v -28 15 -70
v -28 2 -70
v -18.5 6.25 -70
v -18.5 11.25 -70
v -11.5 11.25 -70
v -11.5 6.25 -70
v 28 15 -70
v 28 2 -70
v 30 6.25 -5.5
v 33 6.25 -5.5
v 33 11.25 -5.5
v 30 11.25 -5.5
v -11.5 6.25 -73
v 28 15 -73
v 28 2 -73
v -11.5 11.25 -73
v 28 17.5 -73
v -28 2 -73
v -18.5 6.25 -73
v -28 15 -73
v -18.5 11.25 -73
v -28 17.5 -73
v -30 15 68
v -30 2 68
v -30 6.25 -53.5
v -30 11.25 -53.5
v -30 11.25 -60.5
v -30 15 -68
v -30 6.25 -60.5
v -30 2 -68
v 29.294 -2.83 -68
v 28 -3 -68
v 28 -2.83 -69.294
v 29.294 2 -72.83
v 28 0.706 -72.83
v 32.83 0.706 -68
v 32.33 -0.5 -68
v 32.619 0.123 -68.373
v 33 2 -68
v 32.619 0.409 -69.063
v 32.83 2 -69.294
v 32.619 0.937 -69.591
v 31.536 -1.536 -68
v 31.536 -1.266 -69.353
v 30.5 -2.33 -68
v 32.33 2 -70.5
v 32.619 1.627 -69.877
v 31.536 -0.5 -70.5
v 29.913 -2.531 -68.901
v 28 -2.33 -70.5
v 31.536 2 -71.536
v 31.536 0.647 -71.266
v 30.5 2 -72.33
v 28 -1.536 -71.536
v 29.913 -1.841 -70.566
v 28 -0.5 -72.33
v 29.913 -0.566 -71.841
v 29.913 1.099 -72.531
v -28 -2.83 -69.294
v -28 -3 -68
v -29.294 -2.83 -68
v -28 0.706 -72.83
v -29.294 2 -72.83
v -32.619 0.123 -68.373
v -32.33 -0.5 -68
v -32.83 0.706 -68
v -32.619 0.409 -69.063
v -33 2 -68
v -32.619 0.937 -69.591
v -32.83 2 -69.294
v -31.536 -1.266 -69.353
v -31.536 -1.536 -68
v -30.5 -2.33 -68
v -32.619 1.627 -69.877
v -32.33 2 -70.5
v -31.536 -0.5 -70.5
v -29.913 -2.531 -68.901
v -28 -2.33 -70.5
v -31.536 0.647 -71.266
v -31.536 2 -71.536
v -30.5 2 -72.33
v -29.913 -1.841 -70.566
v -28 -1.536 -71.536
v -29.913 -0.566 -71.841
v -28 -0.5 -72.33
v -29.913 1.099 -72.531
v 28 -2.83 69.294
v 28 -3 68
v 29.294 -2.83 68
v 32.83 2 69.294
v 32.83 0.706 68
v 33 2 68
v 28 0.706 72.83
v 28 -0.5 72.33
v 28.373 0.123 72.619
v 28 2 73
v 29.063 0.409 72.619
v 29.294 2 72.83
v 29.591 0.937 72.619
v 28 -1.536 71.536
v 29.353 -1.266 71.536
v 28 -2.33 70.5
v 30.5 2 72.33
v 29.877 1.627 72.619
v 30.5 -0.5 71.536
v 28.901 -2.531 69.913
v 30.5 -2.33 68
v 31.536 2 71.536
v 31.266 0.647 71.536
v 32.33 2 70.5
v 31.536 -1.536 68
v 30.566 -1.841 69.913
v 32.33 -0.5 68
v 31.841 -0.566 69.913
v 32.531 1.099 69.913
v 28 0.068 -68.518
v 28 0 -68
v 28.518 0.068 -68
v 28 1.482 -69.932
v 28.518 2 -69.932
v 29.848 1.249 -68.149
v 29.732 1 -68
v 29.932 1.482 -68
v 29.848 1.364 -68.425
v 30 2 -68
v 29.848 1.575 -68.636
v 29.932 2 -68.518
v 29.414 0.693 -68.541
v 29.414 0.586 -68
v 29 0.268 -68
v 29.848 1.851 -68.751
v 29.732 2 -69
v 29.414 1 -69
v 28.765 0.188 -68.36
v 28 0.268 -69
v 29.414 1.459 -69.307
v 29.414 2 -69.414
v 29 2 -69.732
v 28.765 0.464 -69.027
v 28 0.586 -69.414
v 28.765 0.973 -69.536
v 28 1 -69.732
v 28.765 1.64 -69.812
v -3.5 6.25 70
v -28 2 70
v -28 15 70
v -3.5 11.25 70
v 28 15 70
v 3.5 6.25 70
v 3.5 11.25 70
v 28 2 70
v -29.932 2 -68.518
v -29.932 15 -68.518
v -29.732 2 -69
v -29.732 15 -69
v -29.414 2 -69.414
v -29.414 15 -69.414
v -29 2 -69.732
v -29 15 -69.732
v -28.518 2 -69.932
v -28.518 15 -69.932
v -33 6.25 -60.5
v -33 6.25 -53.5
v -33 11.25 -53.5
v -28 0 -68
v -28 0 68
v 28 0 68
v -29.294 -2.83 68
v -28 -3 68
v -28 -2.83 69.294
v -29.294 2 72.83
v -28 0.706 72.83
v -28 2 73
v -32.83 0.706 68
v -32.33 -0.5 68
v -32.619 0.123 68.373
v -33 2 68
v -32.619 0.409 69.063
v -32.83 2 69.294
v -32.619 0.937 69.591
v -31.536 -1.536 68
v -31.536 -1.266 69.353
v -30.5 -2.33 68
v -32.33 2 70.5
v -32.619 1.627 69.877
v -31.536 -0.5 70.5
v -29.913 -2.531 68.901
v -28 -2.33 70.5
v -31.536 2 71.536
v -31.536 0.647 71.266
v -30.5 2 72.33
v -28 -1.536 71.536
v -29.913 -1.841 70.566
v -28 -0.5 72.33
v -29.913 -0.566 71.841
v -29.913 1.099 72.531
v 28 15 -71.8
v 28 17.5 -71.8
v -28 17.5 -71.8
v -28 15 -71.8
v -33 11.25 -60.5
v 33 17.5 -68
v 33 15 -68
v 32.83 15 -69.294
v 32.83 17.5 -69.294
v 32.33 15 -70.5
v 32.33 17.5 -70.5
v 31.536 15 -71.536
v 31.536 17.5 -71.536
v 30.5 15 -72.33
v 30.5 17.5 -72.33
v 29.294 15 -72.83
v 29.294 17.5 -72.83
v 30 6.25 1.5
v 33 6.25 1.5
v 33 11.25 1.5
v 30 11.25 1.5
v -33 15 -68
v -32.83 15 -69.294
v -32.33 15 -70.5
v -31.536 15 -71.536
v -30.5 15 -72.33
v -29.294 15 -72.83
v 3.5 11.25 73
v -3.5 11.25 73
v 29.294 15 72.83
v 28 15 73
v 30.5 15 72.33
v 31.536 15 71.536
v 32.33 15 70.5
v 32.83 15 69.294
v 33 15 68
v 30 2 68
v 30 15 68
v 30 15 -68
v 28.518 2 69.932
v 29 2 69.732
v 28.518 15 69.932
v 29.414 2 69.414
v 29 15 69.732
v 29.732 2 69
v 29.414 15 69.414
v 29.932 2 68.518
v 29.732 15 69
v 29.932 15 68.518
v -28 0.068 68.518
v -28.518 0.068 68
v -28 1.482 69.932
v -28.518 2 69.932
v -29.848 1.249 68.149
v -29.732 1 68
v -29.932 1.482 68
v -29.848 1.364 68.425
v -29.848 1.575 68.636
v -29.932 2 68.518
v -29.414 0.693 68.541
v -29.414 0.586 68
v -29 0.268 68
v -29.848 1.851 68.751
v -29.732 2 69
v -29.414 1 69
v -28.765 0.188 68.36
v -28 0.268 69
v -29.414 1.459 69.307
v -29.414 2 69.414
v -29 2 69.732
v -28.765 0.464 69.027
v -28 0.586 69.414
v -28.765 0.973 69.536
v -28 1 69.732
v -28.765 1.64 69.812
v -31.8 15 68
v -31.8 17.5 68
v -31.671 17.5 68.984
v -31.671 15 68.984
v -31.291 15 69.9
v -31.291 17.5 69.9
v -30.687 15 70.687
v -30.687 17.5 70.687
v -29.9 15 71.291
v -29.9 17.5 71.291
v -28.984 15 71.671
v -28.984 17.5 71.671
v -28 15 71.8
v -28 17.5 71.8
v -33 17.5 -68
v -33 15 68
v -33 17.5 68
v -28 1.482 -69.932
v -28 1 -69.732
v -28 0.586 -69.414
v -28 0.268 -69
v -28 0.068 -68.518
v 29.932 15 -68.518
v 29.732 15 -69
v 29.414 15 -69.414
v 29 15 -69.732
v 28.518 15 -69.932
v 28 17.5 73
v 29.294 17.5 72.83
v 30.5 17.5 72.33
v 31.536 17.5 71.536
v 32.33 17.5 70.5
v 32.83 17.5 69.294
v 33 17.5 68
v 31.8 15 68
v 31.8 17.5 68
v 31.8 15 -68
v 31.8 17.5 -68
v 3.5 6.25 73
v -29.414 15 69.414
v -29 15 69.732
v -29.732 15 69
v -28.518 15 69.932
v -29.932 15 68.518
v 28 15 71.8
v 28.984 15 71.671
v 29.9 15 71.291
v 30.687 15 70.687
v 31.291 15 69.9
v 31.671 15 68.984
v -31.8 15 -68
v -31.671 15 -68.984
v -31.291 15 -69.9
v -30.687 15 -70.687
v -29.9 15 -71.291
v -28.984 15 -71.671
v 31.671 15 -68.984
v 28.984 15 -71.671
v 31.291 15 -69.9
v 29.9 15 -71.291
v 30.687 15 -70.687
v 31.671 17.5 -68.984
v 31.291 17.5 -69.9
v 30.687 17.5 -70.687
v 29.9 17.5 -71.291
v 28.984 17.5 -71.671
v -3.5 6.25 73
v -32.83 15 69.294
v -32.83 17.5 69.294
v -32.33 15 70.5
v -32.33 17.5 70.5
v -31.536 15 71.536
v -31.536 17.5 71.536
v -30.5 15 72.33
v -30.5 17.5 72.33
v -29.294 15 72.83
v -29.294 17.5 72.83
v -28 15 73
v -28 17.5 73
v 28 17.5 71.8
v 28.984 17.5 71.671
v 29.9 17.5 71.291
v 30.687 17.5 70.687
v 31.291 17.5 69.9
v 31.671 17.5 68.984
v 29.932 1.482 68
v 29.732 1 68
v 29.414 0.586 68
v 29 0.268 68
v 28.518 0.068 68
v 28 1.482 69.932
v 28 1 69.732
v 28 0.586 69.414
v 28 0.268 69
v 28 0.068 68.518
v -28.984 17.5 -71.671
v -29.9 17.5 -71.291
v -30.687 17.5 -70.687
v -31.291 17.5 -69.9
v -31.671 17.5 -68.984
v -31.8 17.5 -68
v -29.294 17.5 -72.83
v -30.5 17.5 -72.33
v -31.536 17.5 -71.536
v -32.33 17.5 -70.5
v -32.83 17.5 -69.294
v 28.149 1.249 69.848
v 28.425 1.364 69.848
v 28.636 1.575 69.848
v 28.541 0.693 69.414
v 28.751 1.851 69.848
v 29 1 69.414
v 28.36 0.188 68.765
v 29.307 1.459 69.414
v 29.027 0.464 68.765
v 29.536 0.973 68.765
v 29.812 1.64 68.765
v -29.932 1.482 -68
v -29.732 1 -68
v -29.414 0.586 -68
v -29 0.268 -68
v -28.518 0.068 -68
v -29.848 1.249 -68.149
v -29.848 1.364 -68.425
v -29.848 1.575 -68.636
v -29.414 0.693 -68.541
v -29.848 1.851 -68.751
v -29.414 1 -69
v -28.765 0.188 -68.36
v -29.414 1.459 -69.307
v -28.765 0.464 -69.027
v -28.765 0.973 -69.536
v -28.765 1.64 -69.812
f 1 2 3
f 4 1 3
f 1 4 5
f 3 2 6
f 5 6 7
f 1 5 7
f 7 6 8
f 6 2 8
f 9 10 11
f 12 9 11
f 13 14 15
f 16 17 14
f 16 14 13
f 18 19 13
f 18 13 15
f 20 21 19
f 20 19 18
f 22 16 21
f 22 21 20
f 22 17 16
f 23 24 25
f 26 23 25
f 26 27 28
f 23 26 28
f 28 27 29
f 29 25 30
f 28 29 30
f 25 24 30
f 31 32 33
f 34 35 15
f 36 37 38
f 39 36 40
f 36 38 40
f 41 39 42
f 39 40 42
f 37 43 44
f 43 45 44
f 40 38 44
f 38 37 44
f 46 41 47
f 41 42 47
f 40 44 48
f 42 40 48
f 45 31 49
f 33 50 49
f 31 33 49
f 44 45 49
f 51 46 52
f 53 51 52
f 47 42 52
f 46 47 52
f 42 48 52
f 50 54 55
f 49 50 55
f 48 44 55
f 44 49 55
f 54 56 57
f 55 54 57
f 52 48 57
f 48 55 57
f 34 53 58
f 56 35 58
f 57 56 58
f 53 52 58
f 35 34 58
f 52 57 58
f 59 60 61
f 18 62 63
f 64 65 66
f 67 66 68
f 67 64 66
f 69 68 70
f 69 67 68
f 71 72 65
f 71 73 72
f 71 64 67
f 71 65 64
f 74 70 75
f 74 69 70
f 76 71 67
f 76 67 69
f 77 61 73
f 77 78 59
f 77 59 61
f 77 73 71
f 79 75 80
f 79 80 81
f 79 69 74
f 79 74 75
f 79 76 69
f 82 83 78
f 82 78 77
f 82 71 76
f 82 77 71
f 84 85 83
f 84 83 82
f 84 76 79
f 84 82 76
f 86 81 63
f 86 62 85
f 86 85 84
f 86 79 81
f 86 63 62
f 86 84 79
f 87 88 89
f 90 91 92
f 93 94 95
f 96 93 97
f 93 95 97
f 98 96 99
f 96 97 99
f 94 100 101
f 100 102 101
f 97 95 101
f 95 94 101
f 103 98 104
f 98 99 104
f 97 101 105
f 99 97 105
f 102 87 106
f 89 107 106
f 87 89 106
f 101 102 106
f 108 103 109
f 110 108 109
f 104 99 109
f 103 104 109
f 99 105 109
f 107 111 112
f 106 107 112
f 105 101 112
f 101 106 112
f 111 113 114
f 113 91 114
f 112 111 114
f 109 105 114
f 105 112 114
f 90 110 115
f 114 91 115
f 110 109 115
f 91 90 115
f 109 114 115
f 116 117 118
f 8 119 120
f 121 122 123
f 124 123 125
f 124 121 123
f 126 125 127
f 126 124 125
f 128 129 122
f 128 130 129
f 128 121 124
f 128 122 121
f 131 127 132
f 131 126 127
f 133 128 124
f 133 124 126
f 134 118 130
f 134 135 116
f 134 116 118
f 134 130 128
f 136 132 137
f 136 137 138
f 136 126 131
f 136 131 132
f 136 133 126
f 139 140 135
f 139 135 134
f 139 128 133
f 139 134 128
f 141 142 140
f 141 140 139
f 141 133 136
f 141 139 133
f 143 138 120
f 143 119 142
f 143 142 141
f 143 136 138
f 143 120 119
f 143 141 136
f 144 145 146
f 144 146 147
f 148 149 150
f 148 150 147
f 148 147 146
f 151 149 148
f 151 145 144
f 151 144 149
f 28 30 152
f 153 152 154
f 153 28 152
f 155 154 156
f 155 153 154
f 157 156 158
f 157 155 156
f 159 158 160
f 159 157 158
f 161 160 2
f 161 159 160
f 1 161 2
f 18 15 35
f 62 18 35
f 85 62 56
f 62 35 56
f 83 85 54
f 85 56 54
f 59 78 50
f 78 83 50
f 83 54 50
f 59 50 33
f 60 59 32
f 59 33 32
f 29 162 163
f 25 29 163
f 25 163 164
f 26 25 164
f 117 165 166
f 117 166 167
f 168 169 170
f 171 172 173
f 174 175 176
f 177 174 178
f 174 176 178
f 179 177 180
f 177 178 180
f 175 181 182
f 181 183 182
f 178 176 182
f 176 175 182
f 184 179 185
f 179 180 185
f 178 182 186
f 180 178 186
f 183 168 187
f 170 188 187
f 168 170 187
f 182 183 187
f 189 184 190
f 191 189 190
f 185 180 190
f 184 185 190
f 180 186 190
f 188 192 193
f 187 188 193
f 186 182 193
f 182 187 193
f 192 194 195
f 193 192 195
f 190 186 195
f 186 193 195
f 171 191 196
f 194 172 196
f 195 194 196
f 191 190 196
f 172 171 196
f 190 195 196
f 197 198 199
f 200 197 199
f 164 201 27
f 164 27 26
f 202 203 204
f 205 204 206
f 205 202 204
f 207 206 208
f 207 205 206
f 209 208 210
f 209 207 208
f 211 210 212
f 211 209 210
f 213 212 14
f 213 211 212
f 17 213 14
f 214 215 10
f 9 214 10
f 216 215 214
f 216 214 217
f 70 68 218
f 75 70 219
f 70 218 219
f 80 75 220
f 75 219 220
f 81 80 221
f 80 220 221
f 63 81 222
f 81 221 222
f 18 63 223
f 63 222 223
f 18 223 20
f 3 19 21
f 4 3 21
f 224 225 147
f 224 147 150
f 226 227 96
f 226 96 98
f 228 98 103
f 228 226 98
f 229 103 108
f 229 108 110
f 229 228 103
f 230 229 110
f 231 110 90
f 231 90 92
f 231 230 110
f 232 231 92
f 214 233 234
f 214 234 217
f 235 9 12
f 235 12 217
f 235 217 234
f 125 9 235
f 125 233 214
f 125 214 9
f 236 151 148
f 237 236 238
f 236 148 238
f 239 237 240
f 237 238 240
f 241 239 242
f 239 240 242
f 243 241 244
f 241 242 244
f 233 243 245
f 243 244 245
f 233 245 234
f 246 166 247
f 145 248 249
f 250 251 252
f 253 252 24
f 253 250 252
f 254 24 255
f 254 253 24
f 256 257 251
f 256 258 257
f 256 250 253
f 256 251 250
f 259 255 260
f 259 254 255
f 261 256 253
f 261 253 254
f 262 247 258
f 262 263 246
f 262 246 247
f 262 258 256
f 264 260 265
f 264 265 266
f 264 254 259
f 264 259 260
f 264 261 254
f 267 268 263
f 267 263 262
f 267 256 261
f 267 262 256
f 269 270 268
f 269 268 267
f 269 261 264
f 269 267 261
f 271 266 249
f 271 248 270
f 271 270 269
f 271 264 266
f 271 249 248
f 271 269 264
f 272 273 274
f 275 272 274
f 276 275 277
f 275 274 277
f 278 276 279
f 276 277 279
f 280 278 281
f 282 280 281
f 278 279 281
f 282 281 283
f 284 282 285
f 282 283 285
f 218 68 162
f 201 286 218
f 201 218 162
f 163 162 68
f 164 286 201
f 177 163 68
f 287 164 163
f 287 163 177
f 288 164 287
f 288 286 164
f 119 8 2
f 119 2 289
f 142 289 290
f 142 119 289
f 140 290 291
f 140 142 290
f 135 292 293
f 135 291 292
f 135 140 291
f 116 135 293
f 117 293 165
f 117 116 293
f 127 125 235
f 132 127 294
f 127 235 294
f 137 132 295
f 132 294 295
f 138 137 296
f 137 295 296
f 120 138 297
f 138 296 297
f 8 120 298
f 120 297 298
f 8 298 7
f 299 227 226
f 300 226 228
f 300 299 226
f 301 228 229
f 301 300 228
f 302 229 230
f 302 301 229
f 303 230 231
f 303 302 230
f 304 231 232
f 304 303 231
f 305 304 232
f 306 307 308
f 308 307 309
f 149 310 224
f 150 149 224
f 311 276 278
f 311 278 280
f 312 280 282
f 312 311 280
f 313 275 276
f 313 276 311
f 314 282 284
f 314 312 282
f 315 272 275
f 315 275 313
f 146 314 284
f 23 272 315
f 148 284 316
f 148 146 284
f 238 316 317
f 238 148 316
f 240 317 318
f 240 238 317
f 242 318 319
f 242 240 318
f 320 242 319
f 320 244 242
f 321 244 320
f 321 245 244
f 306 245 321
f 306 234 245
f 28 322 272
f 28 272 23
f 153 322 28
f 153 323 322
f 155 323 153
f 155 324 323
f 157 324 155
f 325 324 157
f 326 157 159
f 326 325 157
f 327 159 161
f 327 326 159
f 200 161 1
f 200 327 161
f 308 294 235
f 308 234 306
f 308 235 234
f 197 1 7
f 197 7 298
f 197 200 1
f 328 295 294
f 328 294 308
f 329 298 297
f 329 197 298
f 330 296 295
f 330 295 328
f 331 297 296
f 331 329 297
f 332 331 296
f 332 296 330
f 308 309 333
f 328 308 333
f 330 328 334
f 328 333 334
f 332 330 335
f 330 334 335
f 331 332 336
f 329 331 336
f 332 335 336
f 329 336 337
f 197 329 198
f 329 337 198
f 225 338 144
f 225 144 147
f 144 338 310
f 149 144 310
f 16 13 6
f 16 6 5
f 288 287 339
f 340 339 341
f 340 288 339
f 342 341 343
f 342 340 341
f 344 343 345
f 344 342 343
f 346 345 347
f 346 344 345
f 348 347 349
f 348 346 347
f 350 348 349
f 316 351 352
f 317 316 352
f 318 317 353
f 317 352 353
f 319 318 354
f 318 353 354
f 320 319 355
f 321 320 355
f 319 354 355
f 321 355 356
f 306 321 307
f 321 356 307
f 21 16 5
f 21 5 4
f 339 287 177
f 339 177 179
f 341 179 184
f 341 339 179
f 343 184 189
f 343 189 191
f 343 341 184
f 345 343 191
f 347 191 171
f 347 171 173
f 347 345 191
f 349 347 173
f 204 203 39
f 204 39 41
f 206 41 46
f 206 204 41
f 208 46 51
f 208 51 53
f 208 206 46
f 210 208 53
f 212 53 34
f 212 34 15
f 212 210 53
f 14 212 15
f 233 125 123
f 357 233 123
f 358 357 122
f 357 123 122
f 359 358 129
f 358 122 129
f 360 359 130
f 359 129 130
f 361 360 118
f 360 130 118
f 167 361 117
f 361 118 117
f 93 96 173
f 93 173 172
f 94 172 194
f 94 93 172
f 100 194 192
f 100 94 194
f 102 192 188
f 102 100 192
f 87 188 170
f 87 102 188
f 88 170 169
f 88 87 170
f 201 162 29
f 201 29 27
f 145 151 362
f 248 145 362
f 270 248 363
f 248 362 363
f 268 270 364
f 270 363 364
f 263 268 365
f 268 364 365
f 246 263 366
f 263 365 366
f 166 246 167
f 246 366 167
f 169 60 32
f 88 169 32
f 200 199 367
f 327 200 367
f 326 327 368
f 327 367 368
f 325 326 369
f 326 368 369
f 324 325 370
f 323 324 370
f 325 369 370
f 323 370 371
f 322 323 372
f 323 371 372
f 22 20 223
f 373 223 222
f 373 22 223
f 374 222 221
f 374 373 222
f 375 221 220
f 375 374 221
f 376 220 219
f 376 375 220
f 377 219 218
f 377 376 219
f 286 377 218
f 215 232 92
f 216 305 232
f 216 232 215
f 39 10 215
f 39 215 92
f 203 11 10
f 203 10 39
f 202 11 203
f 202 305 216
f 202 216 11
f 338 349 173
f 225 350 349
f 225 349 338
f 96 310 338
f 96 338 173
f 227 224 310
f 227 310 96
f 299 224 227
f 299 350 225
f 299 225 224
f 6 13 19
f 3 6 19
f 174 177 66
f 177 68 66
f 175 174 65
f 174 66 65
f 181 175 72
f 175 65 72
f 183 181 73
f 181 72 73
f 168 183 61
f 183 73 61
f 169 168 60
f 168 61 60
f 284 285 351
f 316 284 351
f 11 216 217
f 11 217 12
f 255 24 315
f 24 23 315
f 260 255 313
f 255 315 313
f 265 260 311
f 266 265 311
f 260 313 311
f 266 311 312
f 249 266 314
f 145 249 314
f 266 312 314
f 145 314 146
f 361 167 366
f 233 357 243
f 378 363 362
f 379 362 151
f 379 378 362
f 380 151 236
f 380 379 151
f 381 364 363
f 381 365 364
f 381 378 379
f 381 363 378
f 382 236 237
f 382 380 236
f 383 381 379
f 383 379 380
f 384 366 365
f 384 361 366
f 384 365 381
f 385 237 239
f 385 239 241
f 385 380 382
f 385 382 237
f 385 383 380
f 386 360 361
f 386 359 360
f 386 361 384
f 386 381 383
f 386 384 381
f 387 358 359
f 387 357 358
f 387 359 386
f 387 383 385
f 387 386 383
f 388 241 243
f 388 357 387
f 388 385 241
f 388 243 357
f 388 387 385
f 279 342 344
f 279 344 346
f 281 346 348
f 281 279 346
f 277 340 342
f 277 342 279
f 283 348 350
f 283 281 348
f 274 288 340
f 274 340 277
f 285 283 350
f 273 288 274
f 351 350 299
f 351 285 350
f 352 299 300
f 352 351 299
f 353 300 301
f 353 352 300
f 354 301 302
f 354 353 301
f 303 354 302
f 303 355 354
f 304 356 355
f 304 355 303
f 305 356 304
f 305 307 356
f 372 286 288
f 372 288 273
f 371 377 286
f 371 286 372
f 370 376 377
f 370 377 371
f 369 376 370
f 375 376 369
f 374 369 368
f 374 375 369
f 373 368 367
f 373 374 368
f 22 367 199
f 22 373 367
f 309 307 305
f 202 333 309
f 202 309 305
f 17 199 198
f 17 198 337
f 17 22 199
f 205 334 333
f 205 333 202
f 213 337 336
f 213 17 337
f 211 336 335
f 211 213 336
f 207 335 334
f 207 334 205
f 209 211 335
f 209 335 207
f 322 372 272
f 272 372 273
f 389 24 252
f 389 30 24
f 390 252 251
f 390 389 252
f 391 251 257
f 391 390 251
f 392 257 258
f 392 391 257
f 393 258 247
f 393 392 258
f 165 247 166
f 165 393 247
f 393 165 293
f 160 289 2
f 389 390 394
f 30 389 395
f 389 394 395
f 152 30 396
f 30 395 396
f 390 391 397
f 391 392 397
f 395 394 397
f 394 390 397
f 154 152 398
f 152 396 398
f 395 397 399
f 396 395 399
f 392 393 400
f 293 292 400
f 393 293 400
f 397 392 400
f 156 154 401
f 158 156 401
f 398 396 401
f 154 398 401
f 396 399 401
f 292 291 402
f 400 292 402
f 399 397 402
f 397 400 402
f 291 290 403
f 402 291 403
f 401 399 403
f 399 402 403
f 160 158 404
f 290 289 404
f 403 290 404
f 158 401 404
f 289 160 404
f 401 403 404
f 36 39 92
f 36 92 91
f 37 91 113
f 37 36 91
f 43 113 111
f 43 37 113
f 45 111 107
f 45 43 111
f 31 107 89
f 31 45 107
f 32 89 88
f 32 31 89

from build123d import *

# Parameters (mm, degrees)
ESBO_O1_W                = 60
ESBO_O1_H                = 140
RESSALTO_EXTRUS_O1_DEPTH = 15
FILETE1_R                = 2
CASCA1_T                 = 3
RESSALTO_EXTRUS_O2_START = 2.5
RESSALTO_EXTRUS_O2_DEPTH = 2.5
CORTE_EXTRUS_O1_REACH    = 101.956
ESBO_O4_W                = 7
ESBO_O4_H                = 5
CORTE_EXTRUS_O2_REACH    = 152.703
ESBO_O5_W                = 7
ESBO_O5_H                = 5
CORTE_EXTRUS_O3_REACH    = 101.956
ESBO_O6_W                = 7
ESBO_O6_H                = 5
CORTE_EXTRUS_O4_REACH    = 152.703
ESBO_O7_W                = 7
ESBO_O7_H                = 5


with BuildPart() as part:
    # Esboço1 → Ressalto-extrusão1 (new body)
    with BuildSketch(Plane(origin=(0, 0, 0), x_dir=(1, 0, 0), z_dir=(0, 1, 0))):
        Rectangle(ESBO_O1_W, ESBO_O1_H)
    extrude(amount=RESSALTO_EXTRUS_O1_DEPTH)

    # Filete1
    filete1_edges = [part.edges().sort_by_distance(p)[0] for p in [
        (0, 0, -70),
        (30, 0, 0),
        (0, 0, 70),
        (-30, 0, 0),
        (-30, 7.5, -70),
        (30, 7.5, -70),
        (30, 7.5, 70),
        (-30, 7.5, 70),
    ]]
    fillet(filete1_edges, radius=FILETE1_R)

    # Casca1
    casca1_openings = [part.faces().sort_by_distance(p)[0] for p in [
        (0, 15, 0),
    ]]
    offset(amount=CASCA1_T, openings=casca1_openings, kind=Kind.INTERSECTION)

    # Esboço3 → Ressalto-extrusão2 (add)
    with BuildSketch(Plane(origin=(0, 15, 0), x_dir=(1, 0, 0), z_dir=(0, 1, 0)).offset(RESSALTO_EXTRUS_O2_START)):
        with BuildLine():
            Line((28, 73), (-28, 73))
            ThreePointArc((-28, 73), (-31.535533906, 71.535533906), (-33, 68))
            Line((-33, 68), (-33, -68))
            ThreePointArc((-33, -68), (-31.535533906, -71.535533906), (-28, -73))
            Line((-28, -73), (28, -73))
            ThreePointArc((28, -73), (31.535533906, -71.535533906), (33, -68))
            Line((33, -68), (33, 68))
            ThreePointArc((33, 68), (31.535533906, 71.535533906), (28, 73))
        make_face()
        with BuildLine():
            Line((-31.8, 68), (-31.8, -68))
            ThreePointArc((-31.8, -68), (-30.687005769, -70.687005769), (-28, -71.8))
            Line((-28, -71.8), (28, -71.8))
            ThreePointArc((28, -71.8), (30.687005769, -70.687005769), (31.8, -68))
            Line((31.8, -68), (31.8, 68))
            ThreePointArc((31.8, 68), (30.687005769, 70.687005769), (28, 71.8))
            Line((28, 71.8), (-28, 71.8))
            ThreePointArc((-28, 71.8), (-30.687005769, 70.687005769), (-31.8, 68))
        make_face(mode=Mode.SUBTRACT)
    extrude(amount=-RESSALTO_EXTRUS_O2_DEPTH)

    # Esboço4 → Corte-extrusão1 (cut, up to next)
    with BuildSketch(Plane.ZY.offset(33), mode=Mode.PRIVATE) as corte_extrus_o1_sk1:
        with Locations((-57, 8.75)):
            Rectangle(ESBO_O4_W, ESBO_O4_H)
    corte_extrus_o1_tool1 = extrude(corte_extrus_o1_sk1.sketch, amount=-CORTE_EXTRUS_O1_REACH, mode=Mode.PRIVATE) & part.part
    add(corte_extrus_o1_tool1.solids().sort_by_distance((-33, 8.75, -57))[0], mode=Mode.SUBTRACT)

    # Esboço5 → Corte-extrusão2 (cut, up to next)
    with BuildSketch(Plane(origin=(0, 0, -73), x_dir=(-1, 0, 0), z_dir=(0, 0, -1)), mode=Mode.PRIVATE) as corte_extrus_o2_sk1:
        with Locations((15, 8.75)):
            Rectangle(ESBO_O5_W, ESBO_O5_H)
    corte_extrus_o2_tool1 = extrude(corte_extrus_o2_sk1.sketch, amount=-CORTE_EXTRUS_O2_REACH, mode=Mode.PRIVATE) & part.part
    add(corte_extrus_o2_tool1.solids().sort_by_distance((-15, 8.75, -73))[0], mode=Mode.SUBTRACT)

    # Esboço6 → Corte-extrusão3 (cut, up to next)
    with BuildSketch(Plane(origin=(33, 0, 0), x_dir=(0, 0, -1), z_dir=(1, 0, 0)), mode=Mode.PRIVATE) as corte_extrus_o3_sk1:
        with Locations((2, 8.75)):
            Rectangle(ESBO_O6_W, ESBO_O6_H)
    corte_extrus_o3_tool1 = extrude(corte_extrus_o3_sk1.sketch, amount=-CORTE_EXTRUS_O3_REACH, mode=Mode.PRIVATE) & part.part
    add(corte_extrus_o3_tool1.solids().sort_by_distance((33, 8.75, -2))[0], mode=Mode.SUBTRACT)

    # Esboço7 → Corte-extrusão4 (cut, up to next)
    with BuildSketch(Plane.XY.offset(73), mode=Mode.PRIVATE) as corte_extrus_o4_sk1:
        with Locations((0, 8.75)):
            Rectangle(ESBO_O7_W, ESBO_O7_H)
    corte_extrus_o4_tool1 = extrude(corte_extrus_o4_sk1.sketch, amount=-CORTE_EXTRUS_O4_REACH, mode=Mode.PRIVATE) & part.part
    add(corte_extrus_o4_tool1.solids().sort_by_distance((0, 8.75, 73))[0], mode=Mode.SUBTRACT)


solid = part.part
